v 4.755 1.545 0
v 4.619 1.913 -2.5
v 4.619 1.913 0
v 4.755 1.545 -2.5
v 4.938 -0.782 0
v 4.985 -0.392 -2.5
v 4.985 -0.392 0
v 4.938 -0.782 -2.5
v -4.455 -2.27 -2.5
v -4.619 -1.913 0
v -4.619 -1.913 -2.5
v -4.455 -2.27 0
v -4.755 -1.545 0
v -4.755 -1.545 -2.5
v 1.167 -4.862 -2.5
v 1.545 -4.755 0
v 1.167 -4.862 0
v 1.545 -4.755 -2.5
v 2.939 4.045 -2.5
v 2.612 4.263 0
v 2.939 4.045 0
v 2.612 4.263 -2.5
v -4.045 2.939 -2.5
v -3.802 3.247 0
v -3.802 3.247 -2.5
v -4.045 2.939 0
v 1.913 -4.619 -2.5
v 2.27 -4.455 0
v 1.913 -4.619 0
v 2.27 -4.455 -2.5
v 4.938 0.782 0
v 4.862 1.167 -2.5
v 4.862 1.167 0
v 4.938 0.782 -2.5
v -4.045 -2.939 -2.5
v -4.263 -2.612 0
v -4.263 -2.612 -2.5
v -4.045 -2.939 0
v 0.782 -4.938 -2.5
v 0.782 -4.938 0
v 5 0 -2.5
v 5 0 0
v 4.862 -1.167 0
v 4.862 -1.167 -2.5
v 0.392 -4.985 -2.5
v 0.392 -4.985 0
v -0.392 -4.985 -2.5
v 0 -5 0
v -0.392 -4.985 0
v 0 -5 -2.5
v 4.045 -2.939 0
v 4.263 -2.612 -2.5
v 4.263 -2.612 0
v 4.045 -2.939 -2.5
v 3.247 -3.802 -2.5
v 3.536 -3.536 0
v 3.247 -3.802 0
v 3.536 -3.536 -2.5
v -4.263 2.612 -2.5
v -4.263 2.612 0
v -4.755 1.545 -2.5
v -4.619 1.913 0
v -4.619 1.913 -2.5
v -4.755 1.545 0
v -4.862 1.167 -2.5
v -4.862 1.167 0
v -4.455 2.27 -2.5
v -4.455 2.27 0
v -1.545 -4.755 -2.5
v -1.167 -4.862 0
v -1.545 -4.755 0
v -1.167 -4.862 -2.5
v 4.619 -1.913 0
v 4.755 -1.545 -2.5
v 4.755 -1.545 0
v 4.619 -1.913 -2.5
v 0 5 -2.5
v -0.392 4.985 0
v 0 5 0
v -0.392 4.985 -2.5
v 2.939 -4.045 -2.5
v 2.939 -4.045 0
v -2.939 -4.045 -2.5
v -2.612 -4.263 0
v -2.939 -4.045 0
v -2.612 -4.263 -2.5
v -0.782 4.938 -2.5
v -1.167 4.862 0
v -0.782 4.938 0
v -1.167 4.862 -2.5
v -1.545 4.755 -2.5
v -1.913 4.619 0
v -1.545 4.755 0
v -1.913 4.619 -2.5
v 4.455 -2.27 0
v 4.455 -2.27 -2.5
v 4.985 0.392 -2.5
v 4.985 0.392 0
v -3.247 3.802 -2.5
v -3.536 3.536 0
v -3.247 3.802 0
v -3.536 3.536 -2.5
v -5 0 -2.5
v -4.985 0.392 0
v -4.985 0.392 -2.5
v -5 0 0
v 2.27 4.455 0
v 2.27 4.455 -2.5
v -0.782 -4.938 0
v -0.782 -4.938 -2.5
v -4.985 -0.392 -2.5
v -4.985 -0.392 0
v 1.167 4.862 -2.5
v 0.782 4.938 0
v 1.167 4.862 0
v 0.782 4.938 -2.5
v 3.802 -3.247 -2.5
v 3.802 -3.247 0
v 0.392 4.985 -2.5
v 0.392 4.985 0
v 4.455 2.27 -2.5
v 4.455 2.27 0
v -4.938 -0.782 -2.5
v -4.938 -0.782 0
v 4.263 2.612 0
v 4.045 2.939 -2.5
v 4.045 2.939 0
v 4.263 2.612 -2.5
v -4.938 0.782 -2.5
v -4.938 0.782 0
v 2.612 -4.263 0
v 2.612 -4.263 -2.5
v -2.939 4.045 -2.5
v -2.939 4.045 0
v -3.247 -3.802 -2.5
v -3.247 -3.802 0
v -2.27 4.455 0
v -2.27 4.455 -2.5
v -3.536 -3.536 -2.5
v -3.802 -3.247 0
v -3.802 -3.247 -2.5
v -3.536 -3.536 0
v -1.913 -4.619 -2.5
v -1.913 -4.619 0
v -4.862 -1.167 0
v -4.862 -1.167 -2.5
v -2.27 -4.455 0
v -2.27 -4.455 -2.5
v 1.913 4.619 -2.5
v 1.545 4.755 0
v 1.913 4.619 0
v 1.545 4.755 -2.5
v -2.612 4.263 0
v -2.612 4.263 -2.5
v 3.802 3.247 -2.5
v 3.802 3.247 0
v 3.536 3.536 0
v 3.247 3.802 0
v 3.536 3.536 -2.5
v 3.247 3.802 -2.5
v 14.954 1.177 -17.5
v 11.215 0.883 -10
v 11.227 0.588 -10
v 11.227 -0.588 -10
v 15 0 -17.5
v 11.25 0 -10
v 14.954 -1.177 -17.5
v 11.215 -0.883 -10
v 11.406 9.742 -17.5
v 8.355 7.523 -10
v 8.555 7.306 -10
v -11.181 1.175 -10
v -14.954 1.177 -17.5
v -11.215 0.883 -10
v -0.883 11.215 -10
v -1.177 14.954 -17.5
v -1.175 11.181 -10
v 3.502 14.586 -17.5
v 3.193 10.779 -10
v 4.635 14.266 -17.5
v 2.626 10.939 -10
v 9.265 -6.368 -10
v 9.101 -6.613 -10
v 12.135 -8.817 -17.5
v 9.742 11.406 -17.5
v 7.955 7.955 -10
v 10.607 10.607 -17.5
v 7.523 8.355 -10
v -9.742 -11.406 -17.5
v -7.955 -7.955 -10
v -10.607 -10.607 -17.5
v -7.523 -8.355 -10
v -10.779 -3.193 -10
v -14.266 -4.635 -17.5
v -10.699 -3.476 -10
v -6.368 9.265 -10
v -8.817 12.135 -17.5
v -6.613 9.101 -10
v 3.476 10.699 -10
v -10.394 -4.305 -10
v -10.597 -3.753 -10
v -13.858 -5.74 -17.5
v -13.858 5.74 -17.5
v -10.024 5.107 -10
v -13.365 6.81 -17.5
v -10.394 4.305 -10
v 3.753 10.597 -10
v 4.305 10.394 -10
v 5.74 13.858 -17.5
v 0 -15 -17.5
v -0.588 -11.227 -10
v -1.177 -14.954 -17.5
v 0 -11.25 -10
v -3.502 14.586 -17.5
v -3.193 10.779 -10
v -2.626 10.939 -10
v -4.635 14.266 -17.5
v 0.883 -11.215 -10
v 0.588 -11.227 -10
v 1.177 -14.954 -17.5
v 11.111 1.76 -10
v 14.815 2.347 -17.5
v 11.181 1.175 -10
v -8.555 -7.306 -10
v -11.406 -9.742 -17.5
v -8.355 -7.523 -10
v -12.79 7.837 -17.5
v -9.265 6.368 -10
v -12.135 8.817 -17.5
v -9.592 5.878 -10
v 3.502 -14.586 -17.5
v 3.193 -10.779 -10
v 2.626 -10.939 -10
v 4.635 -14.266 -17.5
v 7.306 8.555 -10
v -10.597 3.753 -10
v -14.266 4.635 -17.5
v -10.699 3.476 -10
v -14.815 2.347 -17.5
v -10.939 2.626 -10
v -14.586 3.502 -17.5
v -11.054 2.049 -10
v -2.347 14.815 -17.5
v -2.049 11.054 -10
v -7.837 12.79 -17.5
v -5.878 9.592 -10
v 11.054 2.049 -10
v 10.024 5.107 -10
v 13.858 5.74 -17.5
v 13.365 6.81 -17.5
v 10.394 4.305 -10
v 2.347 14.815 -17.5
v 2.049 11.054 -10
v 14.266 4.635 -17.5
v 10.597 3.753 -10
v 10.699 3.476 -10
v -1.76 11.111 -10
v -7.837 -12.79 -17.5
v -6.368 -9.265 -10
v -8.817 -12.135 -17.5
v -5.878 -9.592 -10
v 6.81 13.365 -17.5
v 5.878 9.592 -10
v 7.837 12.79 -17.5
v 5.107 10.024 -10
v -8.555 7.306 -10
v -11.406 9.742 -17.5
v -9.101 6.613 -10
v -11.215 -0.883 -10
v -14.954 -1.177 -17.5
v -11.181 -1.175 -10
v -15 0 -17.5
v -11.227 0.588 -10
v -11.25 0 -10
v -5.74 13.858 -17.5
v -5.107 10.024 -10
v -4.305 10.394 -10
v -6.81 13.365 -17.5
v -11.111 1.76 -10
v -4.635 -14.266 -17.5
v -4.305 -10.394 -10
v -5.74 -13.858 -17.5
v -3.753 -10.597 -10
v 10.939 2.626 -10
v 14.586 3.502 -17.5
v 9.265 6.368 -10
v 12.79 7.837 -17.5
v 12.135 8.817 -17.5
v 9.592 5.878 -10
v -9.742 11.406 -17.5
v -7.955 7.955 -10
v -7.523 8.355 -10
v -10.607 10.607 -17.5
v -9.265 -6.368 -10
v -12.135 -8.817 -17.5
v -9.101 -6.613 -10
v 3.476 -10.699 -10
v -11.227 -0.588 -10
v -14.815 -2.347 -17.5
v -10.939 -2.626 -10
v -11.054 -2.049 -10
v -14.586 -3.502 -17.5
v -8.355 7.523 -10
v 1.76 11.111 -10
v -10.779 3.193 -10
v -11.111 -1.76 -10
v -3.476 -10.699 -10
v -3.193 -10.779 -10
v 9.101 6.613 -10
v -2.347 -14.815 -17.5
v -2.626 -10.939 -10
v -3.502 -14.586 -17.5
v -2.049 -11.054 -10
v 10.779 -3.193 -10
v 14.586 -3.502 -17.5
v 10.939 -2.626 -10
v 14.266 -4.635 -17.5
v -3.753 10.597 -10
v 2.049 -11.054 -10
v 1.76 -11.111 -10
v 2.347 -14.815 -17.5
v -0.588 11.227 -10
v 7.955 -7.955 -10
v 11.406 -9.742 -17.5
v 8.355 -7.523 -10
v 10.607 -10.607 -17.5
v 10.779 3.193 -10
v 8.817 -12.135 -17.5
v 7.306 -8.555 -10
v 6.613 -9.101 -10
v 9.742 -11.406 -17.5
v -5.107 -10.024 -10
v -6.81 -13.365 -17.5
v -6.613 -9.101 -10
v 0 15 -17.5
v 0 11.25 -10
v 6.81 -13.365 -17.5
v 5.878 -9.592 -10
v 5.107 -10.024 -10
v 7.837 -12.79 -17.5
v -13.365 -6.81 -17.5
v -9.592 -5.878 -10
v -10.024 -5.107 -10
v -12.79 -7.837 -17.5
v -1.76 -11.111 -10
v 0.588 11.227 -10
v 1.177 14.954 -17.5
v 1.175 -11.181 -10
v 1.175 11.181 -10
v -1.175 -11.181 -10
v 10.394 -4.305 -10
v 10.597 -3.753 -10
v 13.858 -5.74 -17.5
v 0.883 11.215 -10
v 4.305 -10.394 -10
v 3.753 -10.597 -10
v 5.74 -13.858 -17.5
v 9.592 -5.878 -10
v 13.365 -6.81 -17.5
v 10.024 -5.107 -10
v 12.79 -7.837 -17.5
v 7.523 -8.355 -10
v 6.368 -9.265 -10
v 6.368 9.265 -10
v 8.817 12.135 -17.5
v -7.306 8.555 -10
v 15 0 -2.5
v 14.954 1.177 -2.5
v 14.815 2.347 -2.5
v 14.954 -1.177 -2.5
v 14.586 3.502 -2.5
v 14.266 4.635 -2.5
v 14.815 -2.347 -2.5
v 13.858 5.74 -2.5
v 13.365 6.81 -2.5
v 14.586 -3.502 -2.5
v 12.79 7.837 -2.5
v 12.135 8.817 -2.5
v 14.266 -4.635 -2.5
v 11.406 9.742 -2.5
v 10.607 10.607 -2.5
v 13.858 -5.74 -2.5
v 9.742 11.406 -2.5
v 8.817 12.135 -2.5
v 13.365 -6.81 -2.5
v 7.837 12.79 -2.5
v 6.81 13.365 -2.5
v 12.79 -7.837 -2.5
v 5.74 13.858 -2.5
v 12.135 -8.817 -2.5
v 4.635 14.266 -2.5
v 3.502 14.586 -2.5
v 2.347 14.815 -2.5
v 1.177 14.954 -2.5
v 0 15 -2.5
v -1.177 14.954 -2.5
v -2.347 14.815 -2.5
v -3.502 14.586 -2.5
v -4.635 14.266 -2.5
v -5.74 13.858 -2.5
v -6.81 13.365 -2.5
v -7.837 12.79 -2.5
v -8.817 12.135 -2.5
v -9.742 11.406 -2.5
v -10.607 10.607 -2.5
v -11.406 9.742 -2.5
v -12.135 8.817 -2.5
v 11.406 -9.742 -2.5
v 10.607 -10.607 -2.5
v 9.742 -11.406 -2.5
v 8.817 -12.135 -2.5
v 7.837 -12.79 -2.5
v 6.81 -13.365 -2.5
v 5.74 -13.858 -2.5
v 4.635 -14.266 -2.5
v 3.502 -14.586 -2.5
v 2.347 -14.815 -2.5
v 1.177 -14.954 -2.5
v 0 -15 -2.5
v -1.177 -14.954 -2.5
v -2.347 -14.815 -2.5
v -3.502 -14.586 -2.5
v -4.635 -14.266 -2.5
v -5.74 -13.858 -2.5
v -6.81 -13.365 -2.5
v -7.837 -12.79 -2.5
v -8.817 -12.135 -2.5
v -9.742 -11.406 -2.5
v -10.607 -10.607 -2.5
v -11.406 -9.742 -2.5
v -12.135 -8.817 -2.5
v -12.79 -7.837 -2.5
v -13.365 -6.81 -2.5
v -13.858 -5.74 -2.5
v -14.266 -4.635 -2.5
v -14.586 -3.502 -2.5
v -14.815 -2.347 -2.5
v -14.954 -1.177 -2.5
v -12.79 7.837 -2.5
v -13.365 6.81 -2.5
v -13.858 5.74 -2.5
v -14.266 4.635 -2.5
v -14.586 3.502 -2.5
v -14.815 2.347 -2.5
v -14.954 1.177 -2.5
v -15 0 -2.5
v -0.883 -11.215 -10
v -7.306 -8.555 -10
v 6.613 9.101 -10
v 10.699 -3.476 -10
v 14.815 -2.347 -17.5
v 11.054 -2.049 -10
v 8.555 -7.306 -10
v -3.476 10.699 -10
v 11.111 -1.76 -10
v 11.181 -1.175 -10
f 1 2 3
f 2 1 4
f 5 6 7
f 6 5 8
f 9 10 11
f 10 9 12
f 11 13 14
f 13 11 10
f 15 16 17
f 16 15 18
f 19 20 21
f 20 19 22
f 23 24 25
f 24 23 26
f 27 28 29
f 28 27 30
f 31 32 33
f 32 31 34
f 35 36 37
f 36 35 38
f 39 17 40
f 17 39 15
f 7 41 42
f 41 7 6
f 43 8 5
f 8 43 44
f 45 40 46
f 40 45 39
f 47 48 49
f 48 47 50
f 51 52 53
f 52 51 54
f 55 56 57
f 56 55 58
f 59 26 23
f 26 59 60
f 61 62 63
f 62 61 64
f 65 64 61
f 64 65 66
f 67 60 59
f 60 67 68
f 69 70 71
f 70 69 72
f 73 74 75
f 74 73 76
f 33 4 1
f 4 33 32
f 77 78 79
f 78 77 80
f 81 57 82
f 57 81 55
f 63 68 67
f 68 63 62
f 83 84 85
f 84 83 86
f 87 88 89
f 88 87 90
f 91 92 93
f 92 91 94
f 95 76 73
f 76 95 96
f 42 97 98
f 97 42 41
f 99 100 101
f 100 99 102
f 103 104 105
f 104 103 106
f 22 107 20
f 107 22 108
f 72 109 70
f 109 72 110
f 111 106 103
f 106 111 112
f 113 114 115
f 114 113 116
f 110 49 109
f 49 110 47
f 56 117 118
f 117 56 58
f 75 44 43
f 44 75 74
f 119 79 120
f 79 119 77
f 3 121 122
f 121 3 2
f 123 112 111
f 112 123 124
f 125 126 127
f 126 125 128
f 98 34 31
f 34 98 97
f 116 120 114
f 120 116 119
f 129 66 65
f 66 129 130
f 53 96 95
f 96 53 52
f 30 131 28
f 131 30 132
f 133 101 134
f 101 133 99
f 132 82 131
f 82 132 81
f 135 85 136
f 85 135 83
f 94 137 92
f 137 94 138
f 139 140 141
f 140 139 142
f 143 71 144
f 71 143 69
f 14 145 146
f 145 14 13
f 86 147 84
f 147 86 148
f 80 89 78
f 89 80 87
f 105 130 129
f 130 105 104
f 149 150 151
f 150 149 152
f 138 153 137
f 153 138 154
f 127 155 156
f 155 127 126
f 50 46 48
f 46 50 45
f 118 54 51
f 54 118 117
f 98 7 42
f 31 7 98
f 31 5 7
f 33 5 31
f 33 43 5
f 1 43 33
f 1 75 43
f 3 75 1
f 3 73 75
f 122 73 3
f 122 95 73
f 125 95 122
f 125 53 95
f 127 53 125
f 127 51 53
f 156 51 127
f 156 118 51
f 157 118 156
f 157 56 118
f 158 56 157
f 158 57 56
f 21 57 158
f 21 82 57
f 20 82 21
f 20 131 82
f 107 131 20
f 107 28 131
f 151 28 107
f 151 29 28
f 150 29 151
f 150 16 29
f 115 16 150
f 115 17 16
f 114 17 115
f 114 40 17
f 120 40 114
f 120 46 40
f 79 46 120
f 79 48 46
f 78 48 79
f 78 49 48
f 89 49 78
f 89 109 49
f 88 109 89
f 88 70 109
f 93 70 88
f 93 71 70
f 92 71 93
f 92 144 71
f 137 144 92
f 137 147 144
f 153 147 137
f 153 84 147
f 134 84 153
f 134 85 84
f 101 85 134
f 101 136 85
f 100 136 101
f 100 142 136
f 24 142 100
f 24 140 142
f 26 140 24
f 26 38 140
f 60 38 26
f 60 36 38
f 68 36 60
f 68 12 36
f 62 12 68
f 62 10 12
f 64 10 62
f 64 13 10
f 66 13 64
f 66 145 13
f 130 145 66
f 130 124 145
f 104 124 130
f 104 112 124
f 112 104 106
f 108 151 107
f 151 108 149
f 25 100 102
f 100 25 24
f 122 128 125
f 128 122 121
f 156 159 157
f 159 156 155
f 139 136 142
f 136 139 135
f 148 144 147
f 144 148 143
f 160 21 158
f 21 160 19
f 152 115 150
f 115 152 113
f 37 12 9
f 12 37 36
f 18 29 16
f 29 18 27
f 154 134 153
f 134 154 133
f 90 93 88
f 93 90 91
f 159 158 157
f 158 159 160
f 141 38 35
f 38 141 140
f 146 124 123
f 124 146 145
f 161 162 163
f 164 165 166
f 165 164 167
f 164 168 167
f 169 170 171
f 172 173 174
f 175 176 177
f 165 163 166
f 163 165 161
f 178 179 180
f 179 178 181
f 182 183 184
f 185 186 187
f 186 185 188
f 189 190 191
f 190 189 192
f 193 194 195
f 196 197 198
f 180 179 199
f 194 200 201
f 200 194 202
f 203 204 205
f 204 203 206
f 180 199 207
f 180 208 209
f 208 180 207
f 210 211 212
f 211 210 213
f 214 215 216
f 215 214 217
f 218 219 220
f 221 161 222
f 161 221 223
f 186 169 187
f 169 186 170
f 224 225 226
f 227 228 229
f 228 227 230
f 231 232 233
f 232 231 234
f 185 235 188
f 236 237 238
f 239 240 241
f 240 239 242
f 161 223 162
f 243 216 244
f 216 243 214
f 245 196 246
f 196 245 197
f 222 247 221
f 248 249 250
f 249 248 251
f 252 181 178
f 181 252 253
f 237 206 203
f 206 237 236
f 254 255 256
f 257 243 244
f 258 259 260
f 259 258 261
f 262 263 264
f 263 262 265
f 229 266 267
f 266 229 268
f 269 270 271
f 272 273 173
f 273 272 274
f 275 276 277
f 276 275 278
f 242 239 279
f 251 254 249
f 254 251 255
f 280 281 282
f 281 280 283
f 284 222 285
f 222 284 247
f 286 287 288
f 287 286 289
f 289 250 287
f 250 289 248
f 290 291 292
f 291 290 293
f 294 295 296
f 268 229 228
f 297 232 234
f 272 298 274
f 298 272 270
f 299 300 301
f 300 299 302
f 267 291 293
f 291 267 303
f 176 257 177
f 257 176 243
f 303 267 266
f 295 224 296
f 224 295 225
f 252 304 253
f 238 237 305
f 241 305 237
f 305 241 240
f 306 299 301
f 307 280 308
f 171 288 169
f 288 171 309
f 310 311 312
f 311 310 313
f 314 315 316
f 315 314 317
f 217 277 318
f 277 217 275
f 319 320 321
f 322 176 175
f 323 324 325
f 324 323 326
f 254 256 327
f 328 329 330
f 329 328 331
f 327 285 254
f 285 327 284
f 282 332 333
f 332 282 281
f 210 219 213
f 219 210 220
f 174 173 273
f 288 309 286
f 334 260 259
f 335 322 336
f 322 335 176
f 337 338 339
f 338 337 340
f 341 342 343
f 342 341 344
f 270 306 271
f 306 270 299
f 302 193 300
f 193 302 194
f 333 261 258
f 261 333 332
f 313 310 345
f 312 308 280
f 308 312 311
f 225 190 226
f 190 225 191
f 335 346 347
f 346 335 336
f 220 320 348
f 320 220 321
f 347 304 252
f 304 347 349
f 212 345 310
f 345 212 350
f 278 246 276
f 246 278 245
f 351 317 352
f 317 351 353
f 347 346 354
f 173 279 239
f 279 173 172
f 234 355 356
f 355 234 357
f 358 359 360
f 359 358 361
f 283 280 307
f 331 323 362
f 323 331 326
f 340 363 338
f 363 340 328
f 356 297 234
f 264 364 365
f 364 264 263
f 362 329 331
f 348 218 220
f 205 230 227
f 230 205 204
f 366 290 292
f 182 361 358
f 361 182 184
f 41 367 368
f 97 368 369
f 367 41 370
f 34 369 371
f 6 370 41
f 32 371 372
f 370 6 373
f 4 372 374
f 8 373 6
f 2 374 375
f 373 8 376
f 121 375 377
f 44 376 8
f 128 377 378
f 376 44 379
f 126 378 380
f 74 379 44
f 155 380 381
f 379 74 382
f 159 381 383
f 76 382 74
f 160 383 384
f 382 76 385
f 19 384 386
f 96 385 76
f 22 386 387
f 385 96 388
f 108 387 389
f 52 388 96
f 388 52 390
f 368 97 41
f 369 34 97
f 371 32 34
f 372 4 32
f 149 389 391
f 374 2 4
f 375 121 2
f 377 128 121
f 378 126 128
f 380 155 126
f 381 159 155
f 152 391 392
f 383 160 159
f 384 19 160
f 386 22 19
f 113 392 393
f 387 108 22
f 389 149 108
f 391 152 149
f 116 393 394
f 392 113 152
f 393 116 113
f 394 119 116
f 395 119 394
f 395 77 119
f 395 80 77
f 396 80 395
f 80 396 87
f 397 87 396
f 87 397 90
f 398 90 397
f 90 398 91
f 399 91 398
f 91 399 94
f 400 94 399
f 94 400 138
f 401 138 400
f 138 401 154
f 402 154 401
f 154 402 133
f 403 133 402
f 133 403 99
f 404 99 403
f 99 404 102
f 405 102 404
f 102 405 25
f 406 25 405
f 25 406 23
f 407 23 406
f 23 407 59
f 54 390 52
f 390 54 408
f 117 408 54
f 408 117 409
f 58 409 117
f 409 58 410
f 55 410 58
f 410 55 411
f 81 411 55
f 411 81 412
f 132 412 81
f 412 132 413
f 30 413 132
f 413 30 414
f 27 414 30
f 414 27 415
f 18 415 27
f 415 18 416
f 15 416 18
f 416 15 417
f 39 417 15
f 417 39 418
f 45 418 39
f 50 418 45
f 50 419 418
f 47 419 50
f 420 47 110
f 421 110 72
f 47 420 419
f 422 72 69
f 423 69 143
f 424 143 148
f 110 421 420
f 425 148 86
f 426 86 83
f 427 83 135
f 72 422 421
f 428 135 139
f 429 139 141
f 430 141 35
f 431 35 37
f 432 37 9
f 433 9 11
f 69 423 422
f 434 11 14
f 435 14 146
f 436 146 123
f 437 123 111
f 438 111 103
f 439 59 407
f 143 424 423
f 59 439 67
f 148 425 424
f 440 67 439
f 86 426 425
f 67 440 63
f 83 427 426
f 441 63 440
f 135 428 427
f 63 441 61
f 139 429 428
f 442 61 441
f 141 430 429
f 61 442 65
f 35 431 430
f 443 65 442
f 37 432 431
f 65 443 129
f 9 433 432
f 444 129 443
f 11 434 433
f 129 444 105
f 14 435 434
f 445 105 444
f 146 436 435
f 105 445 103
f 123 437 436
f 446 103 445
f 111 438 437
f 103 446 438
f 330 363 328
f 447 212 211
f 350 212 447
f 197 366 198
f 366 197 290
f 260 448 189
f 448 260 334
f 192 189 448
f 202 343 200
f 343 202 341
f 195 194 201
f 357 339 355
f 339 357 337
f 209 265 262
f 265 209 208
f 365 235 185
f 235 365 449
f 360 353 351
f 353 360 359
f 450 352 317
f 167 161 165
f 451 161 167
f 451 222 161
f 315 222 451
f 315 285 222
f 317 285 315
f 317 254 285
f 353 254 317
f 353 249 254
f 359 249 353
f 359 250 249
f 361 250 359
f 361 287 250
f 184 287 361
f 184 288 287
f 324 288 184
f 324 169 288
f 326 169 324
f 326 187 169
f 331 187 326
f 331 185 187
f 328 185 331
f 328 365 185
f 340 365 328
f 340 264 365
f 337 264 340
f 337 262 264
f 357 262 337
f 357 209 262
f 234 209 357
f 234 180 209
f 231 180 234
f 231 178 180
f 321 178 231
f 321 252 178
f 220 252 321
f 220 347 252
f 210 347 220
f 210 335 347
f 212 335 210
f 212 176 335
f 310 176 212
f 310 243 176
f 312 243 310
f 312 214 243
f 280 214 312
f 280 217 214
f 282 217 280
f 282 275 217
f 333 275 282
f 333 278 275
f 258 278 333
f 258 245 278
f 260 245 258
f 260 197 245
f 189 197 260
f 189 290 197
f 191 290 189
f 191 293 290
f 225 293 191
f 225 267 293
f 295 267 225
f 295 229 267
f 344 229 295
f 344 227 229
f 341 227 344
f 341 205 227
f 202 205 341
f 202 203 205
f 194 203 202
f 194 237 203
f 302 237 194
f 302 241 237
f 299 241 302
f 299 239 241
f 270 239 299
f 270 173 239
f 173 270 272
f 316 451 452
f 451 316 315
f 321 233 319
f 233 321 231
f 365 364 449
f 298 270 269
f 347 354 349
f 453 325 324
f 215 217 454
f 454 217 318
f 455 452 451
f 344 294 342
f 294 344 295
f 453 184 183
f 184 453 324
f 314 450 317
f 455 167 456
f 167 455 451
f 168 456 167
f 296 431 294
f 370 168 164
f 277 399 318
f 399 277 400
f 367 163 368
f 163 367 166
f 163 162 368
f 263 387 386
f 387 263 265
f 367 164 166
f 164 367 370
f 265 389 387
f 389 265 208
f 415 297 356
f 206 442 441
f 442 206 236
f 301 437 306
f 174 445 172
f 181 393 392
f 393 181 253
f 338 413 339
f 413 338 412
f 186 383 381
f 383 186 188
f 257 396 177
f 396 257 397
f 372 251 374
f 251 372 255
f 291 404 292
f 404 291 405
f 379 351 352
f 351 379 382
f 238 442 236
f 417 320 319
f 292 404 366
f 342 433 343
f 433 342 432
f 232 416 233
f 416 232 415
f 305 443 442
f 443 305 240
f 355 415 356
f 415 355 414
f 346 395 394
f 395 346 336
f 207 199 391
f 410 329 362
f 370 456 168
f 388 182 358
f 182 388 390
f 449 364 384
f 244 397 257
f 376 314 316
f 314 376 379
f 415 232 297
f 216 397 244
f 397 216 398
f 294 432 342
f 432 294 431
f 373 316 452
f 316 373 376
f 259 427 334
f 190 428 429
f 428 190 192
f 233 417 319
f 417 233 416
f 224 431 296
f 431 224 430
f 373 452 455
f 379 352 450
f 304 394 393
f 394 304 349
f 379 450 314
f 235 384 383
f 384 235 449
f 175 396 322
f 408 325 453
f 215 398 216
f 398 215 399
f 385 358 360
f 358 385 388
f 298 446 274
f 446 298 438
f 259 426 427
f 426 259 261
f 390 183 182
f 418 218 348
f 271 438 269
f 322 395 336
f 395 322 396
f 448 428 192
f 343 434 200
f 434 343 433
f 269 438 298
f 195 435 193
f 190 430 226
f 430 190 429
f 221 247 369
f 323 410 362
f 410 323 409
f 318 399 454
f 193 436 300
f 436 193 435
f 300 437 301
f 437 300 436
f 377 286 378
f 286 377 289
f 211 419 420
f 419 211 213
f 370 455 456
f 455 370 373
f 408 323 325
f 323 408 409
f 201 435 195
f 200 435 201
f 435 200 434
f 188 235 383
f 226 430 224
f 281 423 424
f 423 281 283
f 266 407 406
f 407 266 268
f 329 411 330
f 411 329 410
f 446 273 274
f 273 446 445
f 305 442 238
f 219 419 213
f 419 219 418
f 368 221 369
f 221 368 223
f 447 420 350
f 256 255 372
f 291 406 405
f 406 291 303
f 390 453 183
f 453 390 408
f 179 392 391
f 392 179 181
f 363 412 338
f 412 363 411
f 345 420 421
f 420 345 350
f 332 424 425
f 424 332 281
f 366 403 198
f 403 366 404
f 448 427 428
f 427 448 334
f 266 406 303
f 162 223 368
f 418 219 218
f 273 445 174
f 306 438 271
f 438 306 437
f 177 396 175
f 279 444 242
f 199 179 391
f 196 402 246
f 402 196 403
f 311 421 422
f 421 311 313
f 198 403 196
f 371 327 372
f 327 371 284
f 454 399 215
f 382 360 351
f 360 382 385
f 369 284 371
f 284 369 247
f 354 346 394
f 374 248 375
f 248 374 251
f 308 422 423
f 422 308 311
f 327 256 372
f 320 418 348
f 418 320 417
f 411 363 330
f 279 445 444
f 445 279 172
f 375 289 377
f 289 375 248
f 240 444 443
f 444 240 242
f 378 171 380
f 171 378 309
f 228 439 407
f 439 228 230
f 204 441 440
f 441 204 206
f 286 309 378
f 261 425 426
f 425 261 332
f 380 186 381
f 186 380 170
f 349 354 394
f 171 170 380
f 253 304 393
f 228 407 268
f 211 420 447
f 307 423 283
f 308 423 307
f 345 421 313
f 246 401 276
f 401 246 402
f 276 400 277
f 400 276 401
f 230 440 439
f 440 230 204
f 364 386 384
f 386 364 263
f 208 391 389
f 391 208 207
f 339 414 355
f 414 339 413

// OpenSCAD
clipHoleRadius = 5;
clipHoleFn = 80;

module sanderBody() {
    difference() {
        minkowski() {
            cylinder(h=1.1, r=50, center=true, $fn=190);
            sphere(r=2.5, $fn=30);
        }

        for (i = [0, 90, 180, 270]) {
            rotate([0, 0, i]) translate([32, 0, 0]) cylinder(h=100, r=clipHoleRadius, $fn=clipHoleFn);
        }
    }

    // Hex key to stick into screwdriver
    screwSize = 4;
    linear_extrude(40) polygon([for (i = [0:6]) [cos(i*360/6)*screwSize, sin(i*360/6)*screwSize]]);
    cylinder(h=10, r=10);
}

module clipPlug() {
    bigRadius = clipHoleRadius * 1.5 * 2;
    rotate([180, 0, 0]) {
        // Small hole for the peg
        cylinder(h=2.5001, r=clipHoleRadius, $fn=clipHoleFn);
        
        // A divoted larger handle that can be printed without supports.
        translate([0, 0, 2.5]) linear_extrude(bigRadius, scale=2.0) circle(r=bigRadius/2, $fn=clipHoleFn);
        translate([0, 0, bigRadius+2.5]) rotate([180, 0, 0]) linear_extrude(bigRadius, scale=2.0) circle(r=bigRadius/2, $fn=clipHoleFn);
    }
}

//sanderBody();

clipPlug();
